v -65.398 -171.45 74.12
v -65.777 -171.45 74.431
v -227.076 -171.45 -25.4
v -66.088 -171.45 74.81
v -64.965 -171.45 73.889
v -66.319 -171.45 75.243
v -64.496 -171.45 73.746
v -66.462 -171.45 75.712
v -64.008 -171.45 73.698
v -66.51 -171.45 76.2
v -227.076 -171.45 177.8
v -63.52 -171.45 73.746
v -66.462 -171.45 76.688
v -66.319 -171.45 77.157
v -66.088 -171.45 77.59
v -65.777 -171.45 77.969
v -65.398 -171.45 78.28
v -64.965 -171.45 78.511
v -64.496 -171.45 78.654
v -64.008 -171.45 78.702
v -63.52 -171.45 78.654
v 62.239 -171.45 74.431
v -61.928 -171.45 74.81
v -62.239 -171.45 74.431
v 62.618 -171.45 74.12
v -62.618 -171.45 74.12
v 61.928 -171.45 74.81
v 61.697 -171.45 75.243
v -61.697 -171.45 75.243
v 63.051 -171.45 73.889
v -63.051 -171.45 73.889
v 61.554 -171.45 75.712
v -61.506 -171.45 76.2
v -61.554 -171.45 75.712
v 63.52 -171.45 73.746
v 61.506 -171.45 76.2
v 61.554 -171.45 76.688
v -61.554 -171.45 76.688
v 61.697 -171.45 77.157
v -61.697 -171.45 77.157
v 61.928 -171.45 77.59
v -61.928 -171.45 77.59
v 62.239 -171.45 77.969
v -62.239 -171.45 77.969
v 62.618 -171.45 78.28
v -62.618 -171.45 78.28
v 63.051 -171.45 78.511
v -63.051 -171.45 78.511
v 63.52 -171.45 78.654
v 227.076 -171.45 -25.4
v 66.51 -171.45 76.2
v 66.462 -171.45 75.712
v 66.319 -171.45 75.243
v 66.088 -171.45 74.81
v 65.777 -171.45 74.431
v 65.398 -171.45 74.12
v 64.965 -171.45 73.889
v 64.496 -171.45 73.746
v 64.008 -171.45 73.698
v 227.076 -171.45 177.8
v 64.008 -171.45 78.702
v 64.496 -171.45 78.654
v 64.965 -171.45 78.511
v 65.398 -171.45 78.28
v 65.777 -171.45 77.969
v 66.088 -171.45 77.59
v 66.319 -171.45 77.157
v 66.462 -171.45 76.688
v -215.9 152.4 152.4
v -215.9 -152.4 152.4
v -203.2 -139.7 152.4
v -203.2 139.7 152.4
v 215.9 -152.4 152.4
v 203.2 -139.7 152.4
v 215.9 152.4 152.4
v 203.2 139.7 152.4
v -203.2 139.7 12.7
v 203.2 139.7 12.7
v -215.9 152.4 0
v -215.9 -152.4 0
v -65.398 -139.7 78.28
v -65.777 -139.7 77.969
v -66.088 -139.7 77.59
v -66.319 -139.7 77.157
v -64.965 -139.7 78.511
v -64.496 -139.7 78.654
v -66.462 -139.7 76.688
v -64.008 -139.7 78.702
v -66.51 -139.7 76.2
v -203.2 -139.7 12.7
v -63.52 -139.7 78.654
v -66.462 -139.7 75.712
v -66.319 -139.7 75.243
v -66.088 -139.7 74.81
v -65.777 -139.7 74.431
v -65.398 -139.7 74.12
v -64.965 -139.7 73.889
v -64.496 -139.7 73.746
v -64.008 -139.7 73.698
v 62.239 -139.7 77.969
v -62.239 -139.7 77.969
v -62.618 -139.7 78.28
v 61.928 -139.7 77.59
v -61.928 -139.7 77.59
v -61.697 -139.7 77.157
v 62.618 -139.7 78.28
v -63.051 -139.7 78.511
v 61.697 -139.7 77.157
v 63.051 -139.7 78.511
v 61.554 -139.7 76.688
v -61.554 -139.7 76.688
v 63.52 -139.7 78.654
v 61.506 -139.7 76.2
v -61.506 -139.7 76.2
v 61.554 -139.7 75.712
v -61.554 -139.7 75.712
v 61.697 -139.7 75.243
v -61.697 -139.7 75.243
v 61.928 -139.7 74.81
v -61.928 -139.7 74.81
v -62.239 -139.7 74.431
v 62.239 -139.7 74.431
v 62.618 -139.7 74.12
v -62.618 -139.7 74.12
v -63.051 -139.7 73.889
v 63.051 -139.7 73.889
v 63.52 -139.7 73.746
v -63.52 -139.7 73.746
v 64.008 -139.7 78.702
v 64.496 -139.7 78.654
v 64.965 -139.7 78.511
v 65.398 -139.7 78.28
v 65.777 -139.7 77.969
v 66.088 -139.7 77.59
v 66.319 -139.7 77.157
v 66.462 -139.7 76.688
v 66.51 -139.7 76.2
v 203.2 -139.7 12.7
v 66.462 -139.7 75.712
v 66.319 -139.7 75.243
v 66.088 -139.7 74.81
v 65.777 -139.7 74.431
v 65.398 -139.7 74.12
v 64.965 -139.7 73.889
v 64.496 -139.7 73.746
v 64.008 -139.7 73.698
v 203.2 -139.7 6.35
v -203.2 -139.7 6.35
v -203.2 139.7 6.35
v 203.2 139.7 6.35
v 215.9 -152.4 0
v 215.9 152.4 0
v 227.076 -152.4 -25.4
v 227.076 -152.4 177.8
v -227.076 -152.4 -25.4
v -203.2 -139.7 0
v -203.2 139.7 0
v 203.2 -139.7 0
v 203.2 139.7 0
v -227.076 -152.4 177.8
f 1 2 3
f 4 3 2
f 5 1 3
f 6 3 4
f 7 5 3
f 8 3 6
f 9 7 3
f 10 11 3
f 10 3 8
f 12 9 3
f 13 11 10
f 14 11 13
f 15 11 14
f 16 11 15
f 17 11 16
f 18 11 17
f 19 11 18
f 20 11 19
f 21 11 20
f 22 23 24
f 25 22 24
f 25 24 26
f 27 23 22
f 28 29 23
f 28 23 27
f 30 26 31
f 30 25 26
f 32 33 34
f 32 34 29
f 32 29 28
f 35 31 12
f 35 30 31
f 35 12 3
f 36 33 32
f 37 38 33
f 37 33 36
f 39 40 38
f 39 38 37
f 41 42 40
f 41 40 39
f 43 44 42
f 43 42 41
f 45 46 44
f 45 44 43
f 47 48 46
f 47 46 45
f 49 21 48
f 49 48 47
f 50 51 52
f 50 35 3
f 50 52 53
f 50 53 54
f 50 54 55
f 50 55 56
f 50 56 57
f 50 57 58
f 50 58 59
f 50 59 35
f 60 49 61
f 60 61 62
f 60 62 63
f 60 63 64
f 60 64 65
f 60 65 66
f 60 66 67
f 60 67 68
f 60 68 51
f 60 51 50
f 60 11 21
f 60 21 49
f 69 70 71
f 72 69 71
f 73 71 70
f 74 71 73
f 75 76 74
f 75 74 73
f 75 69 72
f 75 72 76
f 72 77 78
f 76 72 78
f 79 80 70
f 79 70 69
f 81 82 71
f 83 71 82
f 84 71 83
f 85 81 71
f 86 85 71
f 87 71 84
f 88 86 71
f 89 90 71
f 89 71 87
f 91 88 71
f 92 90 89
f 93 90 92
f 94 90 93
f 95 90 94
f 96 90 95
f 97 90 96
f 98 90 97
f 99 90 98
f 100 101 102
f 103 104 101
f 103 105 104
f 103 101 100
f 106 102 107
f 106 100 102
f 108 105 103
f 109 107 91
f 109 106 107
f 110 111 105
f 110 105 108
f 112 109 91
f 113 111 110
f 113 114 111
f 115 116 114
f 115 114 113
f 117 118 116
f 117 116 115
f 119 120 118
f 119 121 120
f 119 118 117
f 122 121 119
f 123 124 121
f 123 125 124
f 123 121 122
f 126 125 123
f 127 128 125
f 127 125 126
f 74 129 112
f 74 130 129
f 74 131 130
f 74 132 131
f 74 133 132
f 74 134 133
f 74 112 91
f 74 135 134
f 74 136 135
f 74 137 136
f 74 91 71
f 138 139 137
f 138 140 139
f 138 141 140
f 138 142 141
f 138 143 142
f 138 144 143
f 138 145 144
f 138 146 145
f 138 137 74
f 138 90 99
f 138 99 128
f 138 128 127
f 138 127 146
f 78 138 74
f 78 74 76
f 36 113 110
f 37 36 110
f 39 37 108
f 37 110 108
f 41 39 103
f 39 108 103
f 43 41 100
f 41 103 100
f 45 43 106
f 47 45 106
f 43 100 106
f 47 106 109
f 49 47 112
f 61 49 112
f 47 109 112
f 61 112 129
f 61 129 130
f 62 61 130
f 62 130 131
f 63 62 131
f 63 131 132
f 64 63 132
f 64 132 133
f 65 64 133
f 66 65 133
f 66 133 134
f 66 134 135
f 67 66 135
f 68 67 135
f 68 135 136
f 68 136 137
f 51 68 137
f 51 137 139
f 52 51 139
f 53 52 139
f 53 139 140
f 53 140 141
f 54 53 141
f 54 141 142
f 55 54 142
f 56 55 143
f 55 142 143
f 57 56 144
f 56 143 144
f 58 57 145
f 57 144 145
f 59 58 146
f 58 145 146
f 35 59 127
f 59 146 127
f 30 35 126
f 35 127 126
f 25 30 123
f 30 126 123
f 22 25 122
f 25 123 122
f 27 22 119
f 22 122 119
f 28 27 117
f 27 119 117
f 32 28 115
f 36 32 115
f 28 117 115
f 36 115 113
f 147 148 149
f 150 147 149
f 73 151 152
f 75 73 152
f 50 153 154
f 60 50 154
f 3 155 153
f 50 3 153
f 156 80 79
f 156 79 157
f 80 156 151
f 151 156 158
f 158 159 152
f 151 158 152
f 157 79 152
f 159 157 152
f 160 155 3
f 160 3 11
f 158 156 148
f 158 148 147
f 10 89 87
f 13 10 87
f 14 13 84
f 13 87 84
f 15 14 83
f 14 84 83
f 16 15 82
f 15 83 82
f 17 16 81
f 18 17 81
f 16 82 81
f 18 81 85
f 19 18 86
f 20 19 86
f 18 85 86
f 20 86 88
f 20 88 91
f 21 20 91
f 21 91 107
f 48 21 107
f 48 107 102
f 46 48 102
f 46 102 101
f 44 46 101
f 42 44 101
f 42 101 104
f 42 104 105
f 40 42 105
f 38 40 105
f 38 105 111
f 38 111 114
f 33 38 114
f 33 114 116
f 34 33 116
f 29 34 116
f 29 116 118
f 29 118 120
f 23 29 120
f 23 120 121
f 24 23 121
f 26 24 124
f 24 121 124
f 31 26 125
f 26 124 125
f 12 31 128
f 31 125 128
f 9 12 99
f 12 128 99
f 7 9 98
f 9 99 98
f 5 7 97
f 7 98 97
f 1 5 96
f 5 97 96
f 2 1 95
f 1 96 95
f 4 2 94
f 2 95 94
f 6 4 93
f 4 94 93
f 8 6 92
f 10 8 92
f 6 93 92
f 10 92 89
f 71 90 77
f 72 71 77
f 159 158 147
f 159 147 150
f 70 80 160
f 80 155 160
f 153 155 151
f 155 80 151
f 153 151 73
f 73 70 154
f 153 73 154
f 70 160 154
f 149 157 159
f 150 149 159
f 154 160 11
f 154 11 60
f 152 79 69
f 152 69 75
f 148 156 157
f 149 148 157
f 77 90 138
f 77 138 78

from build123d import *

# Parameters (mm, degrees)
F0_W     = 431.8
F0_H     = 304.8
F0_W_2   = 406.4
F0_H_2   = 279.4
F1_DEPTH = 152.4
F2_W     = 279.4
F2_H     = 6.35
F3_DEPTH = 406.4
F4_W     = 454.152
F4_H     = 203.2
F5_DEPTH = 19.05
F7_D     = 5.0038
F7_DEPTH = 31.75


with BuildPart() as f1:
    # F0 (on Top) → F1 (new body)
    with BuildSketch(Plane.XY):
        Rectangle(F0_W, F0_H)
        Rectangle(F0_W_2, F0_H_2, mode=Mode.SUBTRACT)
    extrude(amount=F1_DEPTH)

    # F2 (on face) → F3 (join, through all)
    with BuildSketch(Plane.YZ.offset(-203.2)):
        with Locations((0, 9.525)):
            Rectangle(F2_W, F2_H)
    extrude(amount=F3_DEPTH)

    # F4 (on face) → F5 (join)
    with BuildSketch(Plane.XZ.offset(152.4)):
        with Locations((0, 76.2)):
            Rectangle(F4_W, F4_H)
    extrude(amount=F5_DEPTH)

    # F7
    with Locations(Plane.XZ.offset(171.45)):
        with Locations((-64.008, 76.2), (64.008, 76.2)):
            Hole(F7_D / 2, depth=F7_DEPTH)


solid = f1.part
